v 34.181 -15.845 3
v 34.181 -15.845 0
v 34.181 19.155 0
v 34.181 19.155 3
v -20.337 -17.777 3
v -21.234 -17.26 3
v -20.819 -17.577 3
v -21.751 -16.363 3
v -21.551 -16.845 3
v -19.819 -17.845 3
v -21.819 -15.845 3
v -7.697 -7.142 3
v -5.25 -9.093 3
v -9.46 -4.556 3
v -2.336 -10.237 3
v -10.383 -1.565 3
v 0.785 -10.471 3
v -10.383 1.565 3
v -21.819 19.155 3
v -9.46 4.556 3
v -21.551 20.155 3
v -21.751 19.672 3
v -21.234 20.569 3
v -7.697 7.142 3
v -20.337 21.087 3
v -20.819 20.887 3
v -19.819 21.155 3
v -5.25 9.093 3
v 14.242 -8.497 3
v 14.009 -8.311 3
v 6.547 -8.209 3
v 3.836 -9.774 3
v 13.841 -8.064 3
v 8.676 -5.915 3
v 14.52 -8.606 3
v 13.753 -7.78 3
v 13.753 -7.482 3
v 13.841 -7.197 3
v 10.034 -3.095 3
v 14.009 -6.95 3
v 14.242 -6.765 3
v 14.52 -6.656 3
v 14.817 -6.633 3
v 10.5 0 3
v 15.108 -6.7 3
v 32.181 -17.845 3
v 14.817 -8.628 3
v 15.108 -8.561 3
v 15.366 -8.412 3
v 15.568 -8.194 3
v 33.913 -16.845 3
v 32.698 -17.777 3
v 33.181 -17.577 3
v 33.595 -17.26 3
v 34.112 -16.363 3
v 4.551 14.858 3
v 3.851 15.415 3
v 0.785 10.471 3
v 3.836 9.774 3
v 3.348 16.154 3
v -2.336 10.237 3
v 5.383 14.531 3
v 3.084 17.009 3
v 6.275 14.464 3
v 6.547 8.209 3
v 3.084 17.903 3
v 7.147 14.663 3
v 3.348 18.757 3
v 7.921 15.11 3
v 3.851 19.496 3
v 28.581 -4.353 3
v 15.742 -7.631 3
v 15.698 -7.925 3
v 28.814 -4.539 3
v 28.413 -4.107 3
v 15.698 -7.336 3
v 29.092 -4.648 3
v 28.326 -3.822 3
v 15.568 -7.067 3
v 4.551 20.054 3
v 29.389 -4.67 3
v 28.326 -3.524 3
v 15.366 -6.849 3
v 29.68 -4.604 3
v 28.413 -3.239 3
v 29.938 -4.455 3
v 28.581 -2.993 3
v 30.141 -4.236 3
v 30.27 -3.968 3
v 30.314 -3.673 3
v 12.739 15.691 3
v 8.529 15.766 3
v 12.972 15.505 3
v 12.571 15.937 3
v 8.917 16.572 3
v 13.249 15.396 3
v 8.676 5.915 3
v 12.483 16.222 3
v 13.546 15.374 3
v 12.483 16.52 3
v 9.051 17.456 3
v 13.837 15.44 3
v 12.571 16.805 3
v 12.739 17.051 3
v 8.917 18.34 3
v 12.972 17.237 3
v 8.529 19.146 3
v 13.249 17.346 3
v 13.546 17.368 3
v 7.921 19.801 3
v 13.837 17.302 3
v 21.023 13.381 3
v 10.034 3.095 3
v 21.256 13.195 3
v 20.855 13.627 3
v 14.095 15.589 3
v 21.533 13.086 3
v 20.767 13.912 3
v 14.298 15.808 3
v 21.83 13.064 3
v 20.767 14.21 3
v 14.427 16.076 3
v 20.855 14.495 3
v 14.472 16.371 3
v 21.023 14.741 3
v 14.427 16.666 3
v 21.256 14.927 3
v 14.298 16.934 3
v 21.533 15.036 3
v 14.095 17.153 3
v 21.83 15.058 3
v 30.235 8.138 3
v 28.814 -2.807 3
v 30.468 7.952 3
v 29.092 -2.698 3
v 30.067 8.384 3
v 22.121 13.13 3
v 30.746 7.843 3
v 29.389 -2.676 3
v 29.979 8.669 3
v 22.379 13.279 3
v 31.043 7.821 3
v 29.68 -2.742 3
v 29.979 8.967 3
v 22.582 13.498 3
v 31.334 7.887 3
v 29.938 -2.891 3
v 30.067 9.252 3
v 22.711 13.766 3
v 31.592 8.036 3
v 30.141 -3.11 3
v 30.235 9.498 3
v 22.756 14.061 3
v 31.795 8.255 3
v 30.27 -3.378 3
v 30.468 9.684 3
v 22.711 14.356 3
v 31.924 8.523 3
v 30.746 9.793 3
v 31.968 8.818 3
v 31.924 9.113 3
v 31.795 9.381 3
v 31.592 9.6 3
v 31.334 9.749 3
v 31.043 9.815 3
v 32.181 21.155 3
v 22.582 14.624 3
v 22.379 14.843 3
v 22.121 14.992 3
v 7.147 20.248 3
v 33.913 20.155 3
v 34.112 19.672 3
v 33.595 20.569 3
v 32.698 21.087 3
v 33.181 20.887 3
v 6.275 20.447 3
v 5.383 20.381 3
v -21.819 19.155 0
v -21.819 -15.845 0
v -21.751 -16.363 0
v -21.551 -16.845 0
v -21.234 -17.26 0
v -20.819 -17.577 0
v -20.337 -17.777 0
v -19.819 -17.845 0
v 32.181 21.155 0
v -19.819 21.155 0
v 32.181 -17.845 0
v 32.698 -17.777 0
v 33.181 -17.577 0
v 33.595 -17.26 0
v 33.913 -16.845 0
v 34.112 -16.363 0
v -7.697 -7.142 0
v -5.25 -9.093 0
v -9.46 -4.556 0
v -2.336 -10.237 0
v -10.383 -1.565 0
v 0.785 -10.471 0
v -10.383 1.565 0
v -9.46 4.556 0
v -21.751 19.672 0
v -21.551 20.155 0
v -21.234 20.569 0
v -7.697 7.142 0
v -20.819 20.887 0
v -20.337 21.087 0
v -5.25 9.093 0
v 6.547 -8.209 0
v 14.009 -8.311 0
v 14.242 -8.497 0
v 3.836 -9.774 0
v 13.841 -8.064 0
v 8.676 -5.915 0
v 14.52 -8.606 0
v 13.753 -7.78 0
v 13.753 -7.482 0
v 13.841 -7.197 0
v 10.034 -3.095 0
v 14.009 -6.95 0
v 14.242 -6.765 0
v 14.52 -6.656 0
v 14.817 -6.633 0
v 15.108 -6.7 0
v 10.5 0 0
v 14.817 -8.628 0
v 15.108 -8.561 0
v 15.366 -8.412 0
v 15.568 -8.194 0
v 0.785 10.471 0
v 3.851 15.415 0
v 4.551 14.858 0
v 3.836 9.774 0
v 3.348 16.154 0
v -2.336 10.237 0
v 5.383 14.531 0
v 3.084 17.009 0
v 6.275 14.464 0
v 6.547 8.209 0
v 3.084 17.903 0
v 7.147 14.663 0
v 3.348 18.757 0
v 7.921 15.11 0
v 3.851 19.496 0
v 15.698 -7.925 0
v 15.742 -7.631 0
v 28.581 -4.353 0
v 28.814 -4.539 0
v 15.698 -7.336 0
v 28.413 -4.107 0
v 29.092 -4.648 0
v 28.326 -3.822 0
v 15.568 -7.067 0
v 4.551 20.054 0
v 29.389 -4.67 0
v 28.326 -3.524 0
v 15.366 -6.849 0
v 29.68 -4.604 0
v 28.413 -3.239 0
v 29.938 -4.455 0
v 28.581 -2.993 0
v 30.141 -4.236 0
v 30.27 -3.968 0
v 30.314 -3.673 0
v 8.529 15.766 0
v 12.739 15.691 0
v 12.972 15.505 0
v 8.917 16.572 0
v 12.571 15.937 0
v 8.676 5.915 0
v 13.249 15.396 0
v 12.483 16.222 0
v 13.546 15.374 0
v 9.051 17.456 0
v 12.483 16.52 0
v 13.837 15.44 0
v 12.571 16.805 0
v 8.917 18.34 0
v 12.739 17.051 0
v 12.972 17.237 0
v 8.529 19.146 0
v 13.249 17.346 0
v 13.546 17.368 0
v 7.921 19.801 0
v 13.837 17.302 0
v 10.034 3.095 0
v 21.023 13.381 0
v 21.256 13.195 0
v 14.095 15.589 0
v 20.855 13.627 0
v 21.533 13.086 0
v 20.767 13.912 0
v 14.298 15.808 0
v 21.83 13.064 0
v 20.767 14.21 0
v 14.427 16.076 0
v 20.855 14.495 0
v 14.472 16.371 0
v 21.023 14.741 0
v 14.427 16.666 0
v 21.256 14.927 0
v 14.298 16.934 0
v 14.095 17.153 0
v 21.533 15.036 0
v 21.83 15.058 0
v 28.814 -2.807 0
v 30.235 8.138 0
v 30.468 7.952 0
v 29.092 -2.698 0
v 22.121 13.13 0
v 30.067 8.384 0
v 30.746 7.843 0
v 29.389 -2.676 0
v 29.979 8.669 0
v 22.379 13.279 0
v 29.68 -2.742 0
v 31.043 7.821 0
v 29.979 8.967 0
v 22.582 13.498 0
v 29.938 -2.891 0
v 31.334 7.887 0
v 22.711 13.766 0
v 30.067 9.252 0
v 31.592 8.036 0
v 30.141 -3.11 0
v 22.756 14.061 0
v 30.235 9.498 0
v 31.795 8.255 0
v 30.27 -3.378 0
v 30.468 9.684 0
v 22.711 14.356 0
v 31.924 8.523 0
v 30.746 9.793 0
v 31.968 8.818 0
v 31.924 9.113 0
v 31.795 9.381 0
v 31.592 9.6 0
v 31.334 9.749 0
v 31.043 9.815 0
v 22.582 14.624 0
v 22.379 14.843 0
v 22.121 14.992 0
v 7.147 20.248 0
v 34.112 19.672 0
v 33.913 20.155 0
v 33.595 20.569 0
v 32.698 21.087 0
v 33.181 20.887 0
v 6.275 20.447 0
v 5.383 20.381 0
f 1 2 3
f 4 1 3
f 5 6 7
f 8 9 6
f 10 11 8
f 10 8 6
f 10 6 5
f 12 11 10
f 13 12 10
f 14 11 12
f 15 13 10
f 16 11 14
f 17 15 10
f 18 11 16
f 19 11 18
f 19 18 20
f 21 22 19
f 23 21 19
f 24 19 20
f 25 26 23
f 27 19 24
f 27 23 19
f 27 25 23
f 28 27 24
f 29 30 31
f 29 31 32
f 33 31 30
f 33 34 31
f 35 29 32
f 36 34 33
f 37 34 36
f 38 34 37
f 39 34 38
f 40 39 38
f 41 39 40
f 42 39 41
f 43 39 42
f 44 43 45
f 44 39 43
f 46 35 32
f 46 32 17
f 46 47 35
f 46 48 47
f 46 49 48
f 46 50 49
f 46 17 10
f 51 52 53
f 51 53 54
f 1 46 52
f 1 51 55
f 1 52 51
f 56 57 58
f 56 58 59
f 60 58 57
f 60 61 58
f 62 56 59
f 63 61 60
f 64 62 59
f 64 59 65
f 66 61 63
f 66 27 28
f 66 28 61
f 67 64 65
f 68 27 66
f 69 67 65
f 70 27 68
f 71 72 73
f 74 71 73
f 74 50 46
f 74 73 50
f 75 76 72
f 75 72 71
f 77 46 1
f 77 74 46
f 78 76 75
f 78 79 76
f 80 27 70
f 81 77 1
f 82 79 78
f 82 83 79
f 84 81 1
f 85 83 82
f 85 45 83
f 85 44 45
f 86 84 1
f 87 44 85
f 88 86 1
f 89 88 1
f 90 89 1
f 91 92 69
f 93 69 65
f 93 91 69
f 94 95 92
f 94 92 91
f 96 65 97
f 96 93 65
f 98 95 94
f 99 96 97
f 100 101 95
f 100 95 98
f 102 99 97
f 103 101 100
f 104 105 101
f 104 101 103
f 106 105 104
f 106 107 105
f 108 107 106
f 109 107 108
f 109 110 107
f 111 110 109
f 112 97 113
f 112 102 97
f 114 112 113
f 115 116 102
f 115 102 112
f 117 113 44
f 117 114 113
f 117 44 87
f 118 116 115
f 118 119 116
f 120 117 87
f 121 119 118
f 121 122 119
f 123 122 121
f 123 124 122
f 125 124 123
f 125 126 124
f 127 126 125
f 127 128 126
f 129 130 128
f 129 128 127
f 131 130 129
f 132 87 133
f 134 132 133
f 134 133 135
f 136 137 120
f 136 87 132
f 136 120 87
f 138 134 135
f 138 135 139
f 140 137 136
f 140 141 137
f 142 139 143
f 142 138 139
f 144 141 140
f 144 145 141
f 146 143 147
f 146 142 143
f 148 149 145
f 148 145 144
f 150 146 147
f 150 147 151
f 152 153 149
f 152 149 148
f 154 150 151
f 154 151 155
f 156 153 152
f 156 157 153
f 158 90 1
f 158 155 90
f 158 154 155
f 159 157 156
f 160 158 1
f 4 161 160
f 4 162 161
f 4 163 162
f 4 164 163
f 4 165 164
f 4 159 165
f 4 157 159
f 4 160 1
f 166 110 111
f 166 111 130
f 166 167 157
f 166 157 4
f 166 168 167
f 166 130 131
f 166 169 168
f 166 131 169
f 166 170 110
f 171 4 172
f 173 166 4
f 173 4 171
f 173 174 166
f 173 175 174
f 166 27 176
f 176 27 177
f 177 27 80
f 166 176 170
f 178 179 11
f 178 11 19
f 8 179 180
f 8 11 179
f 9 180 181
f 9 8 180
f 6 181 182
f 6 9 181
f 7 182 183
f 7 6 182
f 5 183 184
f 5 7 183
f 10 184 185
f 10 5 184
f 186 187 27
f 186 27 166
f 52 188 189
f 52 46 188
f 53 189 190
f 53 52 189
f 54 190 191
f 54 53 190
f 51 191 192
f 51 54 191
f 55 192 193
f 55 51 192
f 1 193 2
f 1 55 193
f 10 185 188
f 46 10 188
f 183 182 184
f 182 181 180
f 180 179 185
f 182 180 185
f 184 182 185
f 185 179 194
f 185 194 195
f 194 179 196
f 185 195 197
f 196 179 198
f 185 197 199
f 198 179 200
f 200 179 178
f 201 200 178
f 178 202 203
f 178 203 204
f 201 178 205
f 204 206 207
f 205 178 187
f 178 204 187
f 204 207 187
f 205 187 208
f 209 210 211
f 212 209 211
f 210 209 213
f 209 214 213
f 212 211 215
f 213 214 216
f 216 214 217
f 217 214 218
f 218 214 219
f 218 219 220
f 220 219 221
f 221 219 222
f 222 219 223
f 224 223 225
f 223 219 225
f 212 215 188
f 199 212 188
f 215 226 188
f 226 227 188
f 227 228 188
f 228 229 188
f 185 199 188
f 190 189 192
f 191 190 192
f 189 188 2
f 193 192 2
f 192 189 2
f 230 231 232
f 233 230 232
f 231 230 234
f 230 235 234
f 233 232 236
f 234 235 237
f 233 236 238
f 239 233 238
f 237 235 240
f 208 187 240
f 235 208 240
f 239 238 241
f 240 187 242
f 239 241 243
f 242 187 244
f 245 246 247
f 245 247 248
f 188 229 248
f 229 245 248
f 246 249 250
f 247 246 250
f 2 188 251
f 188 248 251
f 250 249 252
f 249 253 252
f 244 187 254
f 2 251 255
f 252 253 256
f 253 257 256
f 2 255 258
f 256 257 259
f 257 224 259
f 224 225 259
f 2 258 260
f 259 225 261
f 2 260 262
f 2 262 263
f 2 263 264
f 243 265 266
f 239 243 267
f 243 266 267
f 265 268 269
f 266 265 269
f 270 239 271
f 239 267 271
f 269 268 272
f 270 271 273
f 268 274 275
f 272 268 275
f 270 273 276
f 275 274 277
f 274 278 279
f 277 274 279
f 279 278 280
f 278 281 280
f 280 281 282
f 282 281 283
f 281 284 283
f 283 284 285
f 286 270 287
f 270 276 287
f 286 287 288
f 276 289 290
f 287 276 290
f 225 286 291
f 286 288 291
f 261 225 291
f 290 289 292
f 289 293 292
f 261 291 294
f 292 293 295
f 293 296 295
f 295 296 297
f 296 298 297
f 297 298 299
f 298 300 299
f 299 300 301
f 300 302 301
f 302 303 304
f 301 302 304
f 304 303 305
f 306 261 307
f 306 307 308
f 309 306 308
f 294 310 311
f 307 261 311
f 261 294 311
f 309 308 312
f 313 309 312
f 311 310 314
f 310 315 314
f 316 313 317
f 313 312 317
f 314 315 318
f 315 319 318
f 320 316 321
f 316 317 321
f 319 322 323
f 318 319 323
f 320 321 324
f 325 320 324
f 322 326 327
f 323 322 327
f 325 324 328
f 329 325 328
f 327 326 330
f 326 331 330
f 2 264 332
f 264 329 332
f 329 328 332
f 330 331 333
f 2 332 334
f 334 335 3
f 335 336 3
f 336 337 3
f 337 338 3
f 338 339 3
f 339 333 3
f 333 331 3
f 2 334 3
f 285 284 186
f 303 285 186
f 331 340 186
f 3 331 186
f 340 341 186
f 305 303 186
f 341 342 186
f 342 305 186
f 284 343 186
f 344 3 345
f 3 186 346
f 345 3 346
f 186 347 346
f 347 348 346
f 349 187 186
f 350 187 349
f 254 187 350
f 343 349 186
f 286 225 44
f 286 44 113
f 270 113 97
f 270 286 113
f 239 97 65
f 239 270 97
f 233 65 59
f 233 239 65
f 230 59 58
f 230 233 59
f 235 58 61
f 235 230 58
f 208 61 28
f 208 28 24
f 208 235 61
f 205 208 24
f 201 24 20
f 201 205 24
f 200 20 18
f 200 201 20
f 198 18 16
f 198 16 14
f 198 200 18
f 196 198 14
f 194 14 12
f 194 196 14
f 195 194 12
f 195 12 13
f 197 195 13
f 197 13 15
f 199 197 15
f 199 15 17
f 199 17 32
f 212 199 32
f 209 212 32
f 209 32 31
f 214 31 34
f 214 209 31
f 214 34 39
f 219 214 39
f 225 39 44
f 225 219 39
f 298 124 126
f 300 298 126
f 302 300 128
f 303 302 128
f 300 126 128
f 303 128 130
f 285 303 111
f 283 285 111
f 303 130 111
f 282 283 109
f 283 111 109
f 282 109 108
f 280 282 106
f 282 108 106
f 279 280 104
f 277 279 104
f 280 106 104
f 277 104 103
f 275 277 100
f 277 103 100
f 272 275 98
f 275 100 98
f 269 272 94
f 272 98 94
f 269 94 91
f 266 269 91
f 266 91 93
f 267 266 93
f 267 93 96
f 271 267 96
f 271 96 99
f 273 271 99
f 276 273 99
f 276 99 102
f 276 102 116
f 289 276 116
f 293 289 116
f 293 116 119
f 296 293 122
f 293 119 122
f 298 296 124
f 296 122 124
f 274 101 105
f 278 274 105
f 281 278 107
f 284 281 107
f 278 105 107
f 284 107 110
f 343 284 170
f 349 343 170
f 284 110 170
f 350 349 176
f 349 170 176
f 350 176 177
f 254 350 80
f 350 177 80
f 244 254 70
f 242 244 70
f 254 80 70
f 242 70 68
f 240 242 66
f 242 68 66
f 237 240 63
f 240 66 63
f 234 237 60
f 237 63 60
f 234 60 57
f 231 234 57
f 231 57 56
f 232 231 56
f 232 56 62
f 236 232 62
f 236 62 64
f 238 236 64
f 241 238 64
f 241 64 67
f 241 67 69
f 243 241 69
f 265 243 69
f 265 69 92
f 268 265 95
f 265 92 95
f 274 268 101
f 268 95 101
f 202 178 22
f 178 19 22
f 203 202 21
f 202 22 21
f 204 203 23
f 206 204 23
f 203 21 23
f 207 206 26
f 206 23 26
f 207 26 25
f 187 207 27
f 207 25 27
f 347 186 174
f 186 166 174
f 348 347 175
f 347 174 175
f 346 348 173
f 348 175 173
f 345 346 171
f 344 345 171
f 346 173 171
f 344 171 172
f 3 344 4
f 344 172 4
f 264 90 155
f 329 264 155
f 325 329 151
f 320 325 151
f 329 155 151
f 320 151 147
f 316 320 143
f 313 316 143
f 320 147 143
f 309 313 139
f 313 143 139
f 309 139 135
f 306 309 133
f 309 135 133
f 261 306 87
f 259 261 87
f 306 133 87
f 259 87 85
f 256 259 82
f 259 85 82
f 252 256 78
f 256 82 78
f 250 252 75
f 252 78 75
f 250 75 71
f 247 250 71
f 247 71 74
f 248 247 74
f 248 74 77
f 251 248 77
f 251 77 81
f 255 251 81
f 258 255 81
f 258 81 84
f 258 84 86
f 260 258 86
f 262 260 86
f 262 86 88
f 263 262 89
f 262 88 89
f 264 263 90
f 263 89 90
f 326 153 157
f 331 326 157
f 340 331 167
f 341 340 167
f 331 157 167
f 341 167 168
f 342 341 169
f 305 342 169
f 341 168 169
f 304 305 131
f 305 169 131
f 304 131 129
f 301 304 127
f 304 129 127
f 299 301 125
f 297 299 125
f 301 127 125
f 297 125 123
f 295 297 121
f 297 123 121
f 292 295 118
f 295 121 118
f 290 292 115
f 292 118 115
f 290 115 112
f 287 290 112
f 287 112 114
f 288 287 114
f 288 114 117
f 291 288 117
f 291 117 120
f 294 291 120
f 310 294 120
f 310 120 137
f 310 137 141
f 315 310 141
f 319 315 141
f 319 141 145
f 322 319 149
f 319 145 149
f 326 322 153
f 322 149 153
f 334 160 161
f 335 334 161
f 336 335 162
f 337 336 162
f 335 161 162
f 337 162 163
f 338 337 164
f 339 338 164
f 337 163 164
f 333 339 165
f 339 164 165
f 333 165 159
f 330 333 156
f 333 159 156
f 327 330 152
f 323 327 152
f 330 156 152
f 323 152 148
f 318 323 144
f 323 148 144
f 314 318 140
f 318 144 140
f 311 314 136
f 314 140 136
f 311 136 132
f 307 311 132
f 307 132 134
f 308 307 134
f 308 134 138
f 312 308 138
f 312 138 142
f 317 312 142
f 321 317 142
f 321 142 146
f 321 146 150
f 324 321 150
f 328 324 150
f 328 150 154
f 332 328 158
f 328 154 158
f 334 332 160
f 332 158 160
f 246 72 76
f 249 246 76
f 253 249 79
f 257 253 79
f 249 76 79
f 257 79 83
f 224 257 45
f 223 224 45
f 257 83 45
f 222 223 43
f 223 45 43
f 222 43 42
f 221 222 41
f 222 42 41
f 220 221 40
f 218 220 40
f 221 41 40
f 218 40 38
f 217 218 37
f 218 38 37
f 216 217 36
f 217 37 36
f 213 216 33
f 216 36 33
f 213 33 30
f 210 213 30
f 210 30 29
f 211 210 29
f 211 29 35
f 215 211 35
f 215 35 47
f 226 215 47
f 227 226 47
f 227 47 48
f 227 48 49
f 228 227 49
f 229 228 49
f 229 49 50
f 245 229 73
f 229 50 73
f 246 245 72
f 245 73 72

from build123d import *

# Parameters (mm, degrees)
F0_W     = 56
F0_H     = 39
F0_R     = 10.5
F1_DEPTH = 3
F2_R     = 2
F3_R     = 1
F3_R_2   = 3
F4_DEPTH = 3


with BuildPart() as f1:
    # F0 (on Top) → F1 (new body)
    with BuildSketch(Plane.XY):
        with Locations((6.180598, 1.654658)):
            Rectangle(F0_W, F0_H)
        Circle(F0_R, mode=Mode.SUBTRACT)
    extrude(amount=F1_DEPTH)

    # F2
    f2_edges = [f1.edges().sort_by_distance(p)[0] for p in [
        (-21.819402, -17.845342, 1.5),
        (34.180598, -17.845342, 1.5),
        (34.180598, 21.154658, 1.5),
        (-21.819402, 21.154658, 1.5),
    ]]
    fillet(f2_edges, radius=F2_R)

    # F3 (on face) → F4 (cut, through all)
    with BuildSketch(Plane.XY.offset(3)):
        with Locations((29.314389, -3.673016)):
            Circle(F3_R)
        with Locations((14.742243, -7.630614)):
            Circle(F3_R)
        with Locations((30.968287, 8.817965)):
            Circle(F3_R)
        with Locations((21.755693, 14.060876)):
            Circle(F3_R)
        with Locations((13.471731, 16.370847)):
            Circle(F3_R)
        with Locations((6.050627, 17.455842)):
            Circle(F3_R_2)
    extrude(amount=-F4_DEPTH, mode=Mode.SUBTRACT)


solid = f1.part
